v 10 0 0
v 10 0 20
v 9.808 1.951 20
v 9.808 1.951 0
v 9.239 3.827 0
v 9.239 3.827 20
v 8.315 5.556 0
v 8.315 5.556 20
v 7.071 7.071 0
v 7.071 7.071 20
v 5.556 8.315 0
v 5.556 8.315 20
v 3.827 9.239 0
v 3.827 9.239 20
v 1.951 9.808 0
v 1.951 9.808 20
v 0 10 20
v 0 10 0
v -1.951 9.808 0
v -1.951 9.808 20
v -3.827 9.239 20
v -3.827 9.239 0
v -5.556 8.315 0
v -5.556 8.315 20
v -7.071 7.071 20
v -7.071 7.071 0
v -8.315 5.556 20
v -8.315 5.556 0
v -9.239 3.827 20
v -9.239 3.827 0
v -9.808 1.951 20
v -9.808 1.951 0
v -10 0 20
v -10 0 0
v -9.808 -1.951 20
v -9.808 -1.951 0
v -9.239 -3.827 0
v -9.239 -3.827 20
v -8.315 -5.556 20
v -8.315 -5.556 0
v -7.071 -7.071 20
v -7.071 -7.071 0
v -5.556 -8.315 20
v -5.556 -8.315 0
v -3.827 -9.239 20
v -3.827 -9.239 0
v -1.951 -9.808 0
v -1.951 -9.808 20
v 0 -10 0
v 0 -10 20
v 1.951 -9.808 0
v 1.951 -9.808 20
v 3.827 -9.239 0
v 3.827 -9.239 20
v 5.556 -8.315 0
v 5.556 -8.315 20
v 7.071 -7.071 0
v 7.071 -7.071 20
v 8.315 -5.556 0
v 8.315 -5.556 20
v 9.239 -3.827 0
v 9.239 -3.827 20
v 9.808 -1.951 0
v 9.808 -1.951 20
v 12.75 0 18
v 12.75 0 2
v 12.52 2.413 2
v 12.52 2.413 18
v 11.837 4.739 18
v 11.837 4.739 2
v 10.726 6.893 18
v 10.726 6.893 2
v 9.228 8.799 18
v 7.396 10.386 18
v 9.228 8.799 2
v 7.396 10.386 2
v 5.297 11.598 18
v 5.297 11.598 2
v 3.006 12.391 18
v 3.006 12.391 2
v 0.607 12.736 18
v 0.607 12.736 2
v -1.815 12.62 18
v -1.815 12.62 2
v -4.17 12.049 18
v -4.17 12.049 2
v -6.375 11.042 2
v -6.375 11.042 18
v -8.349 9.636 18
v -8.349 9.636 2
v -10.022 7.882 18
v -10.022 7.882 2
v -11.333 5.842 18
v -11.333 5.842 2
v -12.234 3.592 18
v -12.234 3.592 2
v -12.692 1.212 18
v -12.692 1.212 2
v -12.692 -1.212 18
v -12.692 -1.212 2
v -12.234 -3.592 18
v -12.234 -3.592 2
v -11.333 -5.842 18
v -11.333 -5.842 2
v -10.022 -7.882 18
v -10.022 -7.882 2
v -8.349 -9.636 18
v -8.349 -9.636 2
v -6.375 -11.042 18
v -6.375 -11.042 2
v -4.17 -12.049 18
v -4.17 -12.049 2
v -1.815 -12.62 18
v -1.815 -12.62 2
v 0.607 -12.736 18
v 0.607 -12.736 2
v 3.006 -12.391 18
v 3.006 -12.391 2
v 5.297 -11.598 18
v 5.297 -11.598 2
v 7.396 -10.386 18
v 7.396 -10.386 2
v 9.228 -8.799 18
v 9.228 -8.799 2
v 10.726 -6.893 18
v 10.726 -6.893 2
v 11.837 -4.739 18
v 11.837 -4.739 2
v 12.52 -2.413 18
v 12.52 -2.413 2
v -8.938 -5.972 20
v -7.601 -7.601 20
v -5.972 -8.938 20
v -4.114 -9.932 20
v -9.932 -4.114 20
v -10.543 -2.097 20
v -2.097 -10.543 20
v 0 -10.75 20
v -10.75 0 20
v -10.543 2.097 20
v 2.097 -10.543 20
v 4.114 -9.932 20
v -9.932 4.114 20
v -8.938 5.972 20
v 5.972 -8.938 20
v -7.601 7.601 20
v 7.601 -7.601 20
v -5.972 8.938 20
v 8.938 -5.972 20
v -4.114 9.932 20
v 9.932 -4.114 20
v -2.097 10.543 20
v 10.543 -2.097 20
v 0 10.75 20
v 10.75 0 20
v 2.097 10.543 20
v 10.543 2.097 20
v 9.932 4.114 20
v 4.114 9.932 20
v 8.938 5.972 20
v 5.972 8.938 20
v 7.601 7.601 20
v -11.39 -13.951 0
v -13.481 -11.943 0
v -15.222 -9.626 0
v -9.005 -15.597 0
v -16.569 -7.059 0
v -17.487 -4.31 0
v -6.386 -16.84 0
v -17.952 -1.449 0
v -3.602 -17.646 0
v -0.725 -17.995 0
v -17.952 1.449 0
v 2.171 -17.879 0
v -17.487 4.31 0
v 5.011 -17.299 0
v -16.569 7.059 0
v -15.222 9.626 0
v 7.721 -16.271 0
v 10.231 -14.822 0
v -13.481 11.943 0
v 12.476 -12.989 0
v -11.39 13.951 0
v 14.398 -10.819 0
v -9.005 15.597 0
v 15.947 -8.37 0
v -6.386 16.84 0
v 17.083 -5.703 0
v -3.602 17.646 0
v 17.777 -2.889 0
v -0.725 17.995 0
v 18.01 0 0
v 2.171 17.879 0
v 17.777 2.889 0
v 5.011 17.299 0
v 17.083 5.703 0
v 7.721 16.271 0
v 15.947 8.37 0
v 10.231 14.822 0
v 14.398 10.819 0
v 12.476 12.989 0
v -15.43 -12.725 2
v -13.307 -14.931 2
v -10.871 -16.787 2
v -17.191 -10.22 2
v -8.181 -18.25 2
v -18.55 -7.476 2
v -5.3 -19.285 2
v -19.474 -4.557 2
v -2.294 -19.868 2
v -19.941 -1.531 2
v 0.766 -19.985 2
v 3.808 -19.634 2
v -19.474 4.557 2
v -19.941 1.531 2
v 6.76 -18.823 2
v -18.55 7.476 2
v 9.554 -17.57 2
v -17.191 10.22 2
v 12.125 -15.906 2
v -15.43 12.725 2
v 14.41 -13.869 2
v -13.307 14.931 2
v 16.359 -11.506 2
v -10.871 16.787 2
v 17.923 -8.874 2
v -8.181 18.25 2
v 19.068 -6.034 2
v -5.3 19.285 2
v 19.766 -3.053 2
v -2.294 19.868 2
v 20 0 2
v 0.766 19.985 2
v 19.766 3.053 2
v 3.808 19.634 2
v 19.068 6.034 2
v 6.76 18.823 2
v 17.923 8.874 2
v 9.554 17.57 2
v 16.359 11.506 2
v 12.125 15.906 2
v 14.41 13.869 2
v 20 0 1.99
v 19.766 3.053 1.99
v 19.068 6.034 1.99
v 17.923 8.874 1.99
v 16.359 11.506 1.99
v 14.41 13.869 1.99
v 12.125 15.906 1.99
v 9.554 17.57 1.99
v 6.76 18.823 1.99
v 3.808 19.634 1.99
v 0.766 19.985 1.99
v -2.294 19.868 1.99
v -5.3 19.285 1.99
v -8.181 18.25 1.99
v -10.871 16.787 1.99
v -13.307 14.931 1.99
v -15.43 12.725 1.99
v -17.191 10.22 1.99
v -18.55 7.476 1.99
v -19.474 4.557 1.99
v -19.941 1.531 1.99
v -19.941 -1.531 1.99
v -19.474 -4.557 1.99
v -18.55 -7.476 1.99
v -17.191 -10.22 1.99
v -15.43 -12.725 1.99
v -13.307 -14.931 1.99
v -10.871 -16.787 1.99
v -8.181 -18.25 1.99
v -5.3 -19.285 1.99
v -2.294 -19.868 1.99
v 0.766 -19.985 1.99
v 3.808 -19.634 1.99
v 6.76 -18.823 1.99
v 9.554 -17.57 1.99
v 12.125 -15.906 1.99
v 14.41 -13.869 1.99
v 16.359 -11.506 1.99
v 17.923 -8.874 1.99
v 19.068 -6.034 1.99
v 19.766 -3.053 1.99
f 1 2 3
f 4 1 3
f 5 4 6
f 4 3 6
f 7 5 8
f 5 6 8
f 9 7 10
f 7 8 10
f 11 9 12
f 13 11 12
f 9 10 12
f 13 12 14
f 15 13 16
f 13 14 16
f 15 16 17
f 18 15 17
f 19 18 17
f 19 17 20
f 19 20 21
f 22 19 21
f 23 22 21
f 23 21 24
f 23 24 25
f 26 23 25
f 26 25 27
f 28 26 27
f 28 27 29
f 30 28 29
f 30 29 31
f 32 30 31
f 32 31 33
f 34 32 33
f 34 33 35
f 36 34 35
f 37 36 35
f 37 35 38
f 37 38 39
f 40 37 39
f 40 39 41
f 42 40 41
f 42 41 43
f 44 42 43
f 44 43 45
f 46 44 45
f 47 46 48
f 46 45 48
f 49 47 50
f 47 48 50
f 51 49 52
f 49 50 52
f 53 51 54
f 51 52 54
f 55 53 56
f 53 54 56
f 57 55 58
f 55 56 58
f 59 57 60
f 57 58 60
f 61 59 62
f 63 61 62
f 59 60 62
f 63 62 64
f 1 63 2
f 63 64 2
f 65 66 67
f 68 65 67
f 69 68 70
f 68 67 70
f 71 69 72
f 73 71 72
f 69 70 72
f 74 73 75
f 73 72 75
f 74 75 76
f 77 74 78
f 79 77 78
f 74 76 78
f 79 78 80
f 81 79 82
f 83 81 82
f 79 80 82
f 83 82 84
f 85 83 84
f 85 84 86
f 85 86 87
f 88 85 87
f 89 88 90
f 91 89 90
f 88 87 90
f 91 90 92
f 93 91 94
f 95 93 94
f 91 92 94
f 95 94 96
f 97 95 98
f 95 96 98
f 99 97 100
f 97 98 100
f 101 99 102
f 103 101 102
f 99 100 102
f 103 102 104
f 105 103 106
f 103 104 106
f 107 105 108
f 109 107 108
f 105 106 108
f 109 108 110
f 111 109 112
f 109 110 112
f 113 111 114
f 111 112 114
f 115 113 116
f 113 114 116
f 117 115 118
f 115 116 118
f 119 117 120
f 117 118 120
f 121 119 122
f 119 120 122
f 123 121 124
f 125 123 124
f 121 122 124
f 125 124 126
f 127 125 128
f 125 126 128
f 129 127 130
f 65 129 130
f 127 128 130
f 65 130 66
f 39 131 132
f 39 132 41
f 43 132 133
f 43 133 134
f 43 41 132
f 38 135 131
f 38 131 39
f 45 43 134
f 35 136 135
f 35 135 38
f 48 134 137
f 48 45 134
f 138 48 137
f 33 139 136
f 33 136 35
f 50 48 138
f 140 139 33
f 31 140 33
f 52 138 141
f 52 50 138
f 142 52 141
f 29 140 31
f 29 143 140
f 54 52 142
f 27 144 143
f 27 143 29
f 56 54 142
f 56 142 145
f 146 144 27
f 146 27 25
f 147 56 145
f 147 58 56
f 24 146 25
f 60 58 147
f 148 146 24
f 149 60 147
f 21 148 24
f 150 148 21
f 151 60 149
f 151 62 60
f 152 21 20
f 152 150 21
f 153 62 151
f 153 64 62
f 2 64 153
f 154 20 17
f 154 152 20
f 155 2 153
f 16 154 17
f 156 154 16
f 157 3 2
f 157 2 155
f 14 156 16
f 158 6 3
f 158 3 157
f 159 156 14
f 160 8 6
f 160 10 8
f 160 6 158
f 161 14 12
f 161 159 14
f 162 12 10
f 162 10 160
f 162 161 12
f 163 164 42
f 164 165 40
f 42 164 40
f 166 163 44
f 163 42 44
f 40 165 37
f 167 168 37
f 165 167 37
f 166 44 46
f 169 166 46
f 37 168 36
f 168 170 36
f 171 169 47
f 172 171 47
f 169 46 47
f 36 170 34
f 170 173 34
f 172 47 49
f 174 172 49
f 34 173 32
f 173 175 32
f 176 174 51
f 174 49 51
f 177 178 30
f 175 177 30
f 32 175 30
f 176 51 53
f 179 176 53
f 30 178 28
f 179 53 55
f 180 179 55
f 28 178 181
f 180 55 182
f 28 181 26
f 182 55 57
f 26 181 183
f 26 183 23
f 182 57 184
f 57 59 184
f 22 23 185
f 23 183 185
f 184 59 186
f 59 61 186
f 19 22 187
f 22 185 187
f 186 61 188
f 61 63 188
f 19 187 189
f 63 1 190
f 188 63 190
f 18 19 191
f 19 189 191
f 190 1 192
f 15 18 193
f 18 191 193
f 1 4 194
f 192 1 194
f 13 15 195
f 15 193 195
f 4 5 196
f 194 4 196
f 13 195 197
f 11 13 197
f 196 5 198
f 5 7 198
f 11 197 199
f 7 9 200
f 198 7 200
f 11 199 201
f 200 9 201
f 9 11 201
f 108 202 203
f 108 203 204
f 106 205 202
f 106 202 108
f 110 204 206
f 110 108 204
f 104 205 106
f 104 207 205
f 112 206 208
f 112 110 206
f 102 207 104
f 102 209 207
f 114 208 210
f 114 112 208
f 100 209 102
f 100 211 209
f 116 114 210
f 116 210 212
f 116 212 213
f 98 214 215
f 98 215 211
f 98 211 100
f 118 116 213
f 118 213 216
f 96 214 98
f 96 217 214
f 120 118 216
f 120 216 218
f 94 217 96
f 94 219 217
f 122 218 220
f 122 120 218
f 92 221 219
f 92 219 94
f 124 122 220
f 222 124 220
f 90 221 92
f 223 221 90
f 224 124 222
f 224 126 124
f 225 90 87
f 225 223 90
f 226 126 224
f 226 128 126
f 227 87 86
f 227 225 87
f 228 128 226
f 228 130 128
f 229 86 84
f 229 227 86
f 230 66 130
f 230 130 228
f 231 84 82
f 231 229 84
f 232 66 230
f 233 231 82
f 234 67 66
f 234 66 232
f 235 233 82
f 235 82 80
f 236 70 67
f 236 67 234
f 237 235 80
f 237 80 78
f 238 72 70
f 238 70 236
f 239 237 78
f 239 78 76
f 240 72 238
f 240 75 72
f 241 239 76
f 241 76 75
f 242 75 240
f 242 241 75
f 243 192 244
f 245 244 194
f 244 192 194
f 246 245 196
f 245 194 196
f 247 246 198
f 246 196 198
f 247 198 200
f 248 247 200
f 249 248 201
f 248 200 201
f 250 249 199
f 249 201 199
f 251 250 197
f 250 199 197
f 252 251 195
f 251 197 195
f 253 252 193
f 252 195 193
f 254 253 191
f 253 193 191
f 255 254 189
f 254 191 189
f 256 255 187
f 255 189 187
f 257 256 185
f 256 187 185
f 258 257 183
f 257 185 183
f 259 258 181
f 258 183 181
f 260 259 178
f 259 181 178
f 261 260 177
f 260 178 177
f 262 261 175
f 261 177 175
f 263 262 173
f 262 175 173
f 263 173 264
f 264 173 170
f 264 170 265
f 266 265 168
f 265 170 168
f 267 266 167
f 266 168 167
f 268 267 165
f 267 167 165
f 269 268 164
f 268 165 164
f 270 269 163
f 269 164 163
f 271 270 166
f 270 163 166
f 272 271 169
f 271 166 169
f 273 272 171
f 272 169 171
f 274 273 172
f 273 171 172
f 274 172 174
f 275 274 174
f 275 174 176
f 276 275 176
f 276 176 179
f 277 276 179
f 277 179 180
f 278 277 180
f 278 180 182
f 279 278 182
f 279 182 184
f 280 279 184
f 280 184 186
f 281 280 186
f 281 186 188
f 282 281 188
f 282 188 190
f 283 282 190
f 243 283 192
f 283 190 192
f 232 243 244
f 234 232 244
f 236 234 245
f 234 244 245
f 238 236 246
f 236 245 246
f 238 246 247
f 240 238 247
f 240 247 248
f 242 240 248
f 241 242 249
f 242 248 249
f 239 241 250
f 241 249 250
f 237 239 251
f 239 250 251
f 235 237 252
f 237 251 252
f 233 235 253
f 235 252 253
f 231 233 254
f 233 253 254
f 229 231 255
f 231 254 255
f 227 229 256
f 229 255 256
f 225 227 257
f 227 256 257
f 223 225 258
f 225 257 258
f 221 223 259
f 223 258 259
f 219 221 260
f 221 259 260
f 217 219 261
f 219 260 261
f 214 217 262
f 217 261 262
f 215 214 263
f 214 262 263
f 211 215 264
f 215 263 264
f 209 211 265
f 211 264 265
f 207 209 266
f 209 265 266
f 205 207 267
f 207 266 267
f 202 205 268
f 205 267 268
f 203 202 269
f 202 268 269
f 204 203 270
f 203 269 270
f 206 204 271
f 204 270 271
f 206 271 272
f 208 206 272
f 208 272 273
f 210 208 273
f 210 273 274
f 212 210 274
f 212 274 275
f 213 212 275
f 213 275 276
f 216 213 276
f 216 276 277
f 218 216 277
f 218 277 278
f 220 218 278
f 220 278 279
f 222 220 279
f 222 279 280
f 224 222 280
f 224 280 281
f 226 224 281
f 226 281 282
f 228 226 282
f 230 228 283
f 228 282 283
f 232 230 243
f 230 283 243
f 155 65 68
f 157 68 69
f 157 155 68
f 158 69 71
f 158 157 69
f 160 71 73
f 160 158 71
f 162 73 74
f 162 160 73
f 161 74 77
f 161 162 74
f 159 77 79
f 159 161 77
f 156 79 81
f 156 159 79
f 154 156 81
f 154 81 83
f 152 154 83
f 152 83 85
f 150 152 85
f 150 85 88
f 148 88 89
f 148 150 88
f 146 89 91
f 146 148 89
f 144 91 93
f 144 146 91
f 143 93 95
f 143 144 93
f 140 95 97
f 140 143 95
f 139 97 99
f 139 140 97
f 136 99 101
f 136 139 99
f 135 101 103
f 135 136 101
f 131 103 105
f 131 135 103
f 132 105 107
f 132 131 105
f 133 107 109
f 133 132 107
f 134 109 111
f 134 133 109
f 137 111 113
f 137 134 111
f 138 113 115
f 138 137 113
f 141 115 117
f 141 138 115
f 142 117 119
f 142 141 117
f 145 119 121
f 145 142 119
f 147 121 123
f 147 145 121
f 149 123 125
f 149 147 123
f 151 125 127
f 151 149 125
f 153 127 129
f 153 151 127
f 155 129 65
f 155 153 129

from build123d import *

# Parameters (mm, degrees)
SKETCH_R        = 20
PAD_DEPTH       = 2
SKETCH001_R     = 12.75
PAD001_DEPTH    = 18
SKETCH002_R     = 10
POCKET_DEPTH    = 20.001
CHAMFER_SIZE    = 2
CHAMFER001_SIZE = 1.99


with BuildPart() as part:
    # Sketch → Pad (new body)
    with BuildSketch(Plane.XY):
        Circle(SKETCH_R)
    extrude(amount=PAD_DEPTH)

    # Sketch001 (on Face3 of Pad) → Pad001 (join)
    with BuildSketch(Plane.XY.offset(2)):
        Circle(SKETCH001_R)
    extrude(amount=PAD001_DEPTH)

    # Sketch002 (on Face5 of Pad001) → Pocket (cut, through all)
    with BuildSketch(Plane.XY.offset(20)):
        Circle(SKETCH002_R)
    extrude(amount=-POCKET_DEPTH, mode=Mode.SUBTRACT)

    # Chamfer
    chamfer_edges = [part.edges().sort_by_distance(p)[0] for p in [
        (-12.75, 0, 20),
    ]]
    chamfer(chamfer_edges, length=CHAMFER_SIZE)

    # Chamfer001
    chamfer001_edges = [part.edges().sort_by_distance(p)[0] for p in [
        (-20, 0, 0),
    ]]
    chamfer(chamfer001_edges, length=CHAMFER001_SIZE)


solid = part.part
